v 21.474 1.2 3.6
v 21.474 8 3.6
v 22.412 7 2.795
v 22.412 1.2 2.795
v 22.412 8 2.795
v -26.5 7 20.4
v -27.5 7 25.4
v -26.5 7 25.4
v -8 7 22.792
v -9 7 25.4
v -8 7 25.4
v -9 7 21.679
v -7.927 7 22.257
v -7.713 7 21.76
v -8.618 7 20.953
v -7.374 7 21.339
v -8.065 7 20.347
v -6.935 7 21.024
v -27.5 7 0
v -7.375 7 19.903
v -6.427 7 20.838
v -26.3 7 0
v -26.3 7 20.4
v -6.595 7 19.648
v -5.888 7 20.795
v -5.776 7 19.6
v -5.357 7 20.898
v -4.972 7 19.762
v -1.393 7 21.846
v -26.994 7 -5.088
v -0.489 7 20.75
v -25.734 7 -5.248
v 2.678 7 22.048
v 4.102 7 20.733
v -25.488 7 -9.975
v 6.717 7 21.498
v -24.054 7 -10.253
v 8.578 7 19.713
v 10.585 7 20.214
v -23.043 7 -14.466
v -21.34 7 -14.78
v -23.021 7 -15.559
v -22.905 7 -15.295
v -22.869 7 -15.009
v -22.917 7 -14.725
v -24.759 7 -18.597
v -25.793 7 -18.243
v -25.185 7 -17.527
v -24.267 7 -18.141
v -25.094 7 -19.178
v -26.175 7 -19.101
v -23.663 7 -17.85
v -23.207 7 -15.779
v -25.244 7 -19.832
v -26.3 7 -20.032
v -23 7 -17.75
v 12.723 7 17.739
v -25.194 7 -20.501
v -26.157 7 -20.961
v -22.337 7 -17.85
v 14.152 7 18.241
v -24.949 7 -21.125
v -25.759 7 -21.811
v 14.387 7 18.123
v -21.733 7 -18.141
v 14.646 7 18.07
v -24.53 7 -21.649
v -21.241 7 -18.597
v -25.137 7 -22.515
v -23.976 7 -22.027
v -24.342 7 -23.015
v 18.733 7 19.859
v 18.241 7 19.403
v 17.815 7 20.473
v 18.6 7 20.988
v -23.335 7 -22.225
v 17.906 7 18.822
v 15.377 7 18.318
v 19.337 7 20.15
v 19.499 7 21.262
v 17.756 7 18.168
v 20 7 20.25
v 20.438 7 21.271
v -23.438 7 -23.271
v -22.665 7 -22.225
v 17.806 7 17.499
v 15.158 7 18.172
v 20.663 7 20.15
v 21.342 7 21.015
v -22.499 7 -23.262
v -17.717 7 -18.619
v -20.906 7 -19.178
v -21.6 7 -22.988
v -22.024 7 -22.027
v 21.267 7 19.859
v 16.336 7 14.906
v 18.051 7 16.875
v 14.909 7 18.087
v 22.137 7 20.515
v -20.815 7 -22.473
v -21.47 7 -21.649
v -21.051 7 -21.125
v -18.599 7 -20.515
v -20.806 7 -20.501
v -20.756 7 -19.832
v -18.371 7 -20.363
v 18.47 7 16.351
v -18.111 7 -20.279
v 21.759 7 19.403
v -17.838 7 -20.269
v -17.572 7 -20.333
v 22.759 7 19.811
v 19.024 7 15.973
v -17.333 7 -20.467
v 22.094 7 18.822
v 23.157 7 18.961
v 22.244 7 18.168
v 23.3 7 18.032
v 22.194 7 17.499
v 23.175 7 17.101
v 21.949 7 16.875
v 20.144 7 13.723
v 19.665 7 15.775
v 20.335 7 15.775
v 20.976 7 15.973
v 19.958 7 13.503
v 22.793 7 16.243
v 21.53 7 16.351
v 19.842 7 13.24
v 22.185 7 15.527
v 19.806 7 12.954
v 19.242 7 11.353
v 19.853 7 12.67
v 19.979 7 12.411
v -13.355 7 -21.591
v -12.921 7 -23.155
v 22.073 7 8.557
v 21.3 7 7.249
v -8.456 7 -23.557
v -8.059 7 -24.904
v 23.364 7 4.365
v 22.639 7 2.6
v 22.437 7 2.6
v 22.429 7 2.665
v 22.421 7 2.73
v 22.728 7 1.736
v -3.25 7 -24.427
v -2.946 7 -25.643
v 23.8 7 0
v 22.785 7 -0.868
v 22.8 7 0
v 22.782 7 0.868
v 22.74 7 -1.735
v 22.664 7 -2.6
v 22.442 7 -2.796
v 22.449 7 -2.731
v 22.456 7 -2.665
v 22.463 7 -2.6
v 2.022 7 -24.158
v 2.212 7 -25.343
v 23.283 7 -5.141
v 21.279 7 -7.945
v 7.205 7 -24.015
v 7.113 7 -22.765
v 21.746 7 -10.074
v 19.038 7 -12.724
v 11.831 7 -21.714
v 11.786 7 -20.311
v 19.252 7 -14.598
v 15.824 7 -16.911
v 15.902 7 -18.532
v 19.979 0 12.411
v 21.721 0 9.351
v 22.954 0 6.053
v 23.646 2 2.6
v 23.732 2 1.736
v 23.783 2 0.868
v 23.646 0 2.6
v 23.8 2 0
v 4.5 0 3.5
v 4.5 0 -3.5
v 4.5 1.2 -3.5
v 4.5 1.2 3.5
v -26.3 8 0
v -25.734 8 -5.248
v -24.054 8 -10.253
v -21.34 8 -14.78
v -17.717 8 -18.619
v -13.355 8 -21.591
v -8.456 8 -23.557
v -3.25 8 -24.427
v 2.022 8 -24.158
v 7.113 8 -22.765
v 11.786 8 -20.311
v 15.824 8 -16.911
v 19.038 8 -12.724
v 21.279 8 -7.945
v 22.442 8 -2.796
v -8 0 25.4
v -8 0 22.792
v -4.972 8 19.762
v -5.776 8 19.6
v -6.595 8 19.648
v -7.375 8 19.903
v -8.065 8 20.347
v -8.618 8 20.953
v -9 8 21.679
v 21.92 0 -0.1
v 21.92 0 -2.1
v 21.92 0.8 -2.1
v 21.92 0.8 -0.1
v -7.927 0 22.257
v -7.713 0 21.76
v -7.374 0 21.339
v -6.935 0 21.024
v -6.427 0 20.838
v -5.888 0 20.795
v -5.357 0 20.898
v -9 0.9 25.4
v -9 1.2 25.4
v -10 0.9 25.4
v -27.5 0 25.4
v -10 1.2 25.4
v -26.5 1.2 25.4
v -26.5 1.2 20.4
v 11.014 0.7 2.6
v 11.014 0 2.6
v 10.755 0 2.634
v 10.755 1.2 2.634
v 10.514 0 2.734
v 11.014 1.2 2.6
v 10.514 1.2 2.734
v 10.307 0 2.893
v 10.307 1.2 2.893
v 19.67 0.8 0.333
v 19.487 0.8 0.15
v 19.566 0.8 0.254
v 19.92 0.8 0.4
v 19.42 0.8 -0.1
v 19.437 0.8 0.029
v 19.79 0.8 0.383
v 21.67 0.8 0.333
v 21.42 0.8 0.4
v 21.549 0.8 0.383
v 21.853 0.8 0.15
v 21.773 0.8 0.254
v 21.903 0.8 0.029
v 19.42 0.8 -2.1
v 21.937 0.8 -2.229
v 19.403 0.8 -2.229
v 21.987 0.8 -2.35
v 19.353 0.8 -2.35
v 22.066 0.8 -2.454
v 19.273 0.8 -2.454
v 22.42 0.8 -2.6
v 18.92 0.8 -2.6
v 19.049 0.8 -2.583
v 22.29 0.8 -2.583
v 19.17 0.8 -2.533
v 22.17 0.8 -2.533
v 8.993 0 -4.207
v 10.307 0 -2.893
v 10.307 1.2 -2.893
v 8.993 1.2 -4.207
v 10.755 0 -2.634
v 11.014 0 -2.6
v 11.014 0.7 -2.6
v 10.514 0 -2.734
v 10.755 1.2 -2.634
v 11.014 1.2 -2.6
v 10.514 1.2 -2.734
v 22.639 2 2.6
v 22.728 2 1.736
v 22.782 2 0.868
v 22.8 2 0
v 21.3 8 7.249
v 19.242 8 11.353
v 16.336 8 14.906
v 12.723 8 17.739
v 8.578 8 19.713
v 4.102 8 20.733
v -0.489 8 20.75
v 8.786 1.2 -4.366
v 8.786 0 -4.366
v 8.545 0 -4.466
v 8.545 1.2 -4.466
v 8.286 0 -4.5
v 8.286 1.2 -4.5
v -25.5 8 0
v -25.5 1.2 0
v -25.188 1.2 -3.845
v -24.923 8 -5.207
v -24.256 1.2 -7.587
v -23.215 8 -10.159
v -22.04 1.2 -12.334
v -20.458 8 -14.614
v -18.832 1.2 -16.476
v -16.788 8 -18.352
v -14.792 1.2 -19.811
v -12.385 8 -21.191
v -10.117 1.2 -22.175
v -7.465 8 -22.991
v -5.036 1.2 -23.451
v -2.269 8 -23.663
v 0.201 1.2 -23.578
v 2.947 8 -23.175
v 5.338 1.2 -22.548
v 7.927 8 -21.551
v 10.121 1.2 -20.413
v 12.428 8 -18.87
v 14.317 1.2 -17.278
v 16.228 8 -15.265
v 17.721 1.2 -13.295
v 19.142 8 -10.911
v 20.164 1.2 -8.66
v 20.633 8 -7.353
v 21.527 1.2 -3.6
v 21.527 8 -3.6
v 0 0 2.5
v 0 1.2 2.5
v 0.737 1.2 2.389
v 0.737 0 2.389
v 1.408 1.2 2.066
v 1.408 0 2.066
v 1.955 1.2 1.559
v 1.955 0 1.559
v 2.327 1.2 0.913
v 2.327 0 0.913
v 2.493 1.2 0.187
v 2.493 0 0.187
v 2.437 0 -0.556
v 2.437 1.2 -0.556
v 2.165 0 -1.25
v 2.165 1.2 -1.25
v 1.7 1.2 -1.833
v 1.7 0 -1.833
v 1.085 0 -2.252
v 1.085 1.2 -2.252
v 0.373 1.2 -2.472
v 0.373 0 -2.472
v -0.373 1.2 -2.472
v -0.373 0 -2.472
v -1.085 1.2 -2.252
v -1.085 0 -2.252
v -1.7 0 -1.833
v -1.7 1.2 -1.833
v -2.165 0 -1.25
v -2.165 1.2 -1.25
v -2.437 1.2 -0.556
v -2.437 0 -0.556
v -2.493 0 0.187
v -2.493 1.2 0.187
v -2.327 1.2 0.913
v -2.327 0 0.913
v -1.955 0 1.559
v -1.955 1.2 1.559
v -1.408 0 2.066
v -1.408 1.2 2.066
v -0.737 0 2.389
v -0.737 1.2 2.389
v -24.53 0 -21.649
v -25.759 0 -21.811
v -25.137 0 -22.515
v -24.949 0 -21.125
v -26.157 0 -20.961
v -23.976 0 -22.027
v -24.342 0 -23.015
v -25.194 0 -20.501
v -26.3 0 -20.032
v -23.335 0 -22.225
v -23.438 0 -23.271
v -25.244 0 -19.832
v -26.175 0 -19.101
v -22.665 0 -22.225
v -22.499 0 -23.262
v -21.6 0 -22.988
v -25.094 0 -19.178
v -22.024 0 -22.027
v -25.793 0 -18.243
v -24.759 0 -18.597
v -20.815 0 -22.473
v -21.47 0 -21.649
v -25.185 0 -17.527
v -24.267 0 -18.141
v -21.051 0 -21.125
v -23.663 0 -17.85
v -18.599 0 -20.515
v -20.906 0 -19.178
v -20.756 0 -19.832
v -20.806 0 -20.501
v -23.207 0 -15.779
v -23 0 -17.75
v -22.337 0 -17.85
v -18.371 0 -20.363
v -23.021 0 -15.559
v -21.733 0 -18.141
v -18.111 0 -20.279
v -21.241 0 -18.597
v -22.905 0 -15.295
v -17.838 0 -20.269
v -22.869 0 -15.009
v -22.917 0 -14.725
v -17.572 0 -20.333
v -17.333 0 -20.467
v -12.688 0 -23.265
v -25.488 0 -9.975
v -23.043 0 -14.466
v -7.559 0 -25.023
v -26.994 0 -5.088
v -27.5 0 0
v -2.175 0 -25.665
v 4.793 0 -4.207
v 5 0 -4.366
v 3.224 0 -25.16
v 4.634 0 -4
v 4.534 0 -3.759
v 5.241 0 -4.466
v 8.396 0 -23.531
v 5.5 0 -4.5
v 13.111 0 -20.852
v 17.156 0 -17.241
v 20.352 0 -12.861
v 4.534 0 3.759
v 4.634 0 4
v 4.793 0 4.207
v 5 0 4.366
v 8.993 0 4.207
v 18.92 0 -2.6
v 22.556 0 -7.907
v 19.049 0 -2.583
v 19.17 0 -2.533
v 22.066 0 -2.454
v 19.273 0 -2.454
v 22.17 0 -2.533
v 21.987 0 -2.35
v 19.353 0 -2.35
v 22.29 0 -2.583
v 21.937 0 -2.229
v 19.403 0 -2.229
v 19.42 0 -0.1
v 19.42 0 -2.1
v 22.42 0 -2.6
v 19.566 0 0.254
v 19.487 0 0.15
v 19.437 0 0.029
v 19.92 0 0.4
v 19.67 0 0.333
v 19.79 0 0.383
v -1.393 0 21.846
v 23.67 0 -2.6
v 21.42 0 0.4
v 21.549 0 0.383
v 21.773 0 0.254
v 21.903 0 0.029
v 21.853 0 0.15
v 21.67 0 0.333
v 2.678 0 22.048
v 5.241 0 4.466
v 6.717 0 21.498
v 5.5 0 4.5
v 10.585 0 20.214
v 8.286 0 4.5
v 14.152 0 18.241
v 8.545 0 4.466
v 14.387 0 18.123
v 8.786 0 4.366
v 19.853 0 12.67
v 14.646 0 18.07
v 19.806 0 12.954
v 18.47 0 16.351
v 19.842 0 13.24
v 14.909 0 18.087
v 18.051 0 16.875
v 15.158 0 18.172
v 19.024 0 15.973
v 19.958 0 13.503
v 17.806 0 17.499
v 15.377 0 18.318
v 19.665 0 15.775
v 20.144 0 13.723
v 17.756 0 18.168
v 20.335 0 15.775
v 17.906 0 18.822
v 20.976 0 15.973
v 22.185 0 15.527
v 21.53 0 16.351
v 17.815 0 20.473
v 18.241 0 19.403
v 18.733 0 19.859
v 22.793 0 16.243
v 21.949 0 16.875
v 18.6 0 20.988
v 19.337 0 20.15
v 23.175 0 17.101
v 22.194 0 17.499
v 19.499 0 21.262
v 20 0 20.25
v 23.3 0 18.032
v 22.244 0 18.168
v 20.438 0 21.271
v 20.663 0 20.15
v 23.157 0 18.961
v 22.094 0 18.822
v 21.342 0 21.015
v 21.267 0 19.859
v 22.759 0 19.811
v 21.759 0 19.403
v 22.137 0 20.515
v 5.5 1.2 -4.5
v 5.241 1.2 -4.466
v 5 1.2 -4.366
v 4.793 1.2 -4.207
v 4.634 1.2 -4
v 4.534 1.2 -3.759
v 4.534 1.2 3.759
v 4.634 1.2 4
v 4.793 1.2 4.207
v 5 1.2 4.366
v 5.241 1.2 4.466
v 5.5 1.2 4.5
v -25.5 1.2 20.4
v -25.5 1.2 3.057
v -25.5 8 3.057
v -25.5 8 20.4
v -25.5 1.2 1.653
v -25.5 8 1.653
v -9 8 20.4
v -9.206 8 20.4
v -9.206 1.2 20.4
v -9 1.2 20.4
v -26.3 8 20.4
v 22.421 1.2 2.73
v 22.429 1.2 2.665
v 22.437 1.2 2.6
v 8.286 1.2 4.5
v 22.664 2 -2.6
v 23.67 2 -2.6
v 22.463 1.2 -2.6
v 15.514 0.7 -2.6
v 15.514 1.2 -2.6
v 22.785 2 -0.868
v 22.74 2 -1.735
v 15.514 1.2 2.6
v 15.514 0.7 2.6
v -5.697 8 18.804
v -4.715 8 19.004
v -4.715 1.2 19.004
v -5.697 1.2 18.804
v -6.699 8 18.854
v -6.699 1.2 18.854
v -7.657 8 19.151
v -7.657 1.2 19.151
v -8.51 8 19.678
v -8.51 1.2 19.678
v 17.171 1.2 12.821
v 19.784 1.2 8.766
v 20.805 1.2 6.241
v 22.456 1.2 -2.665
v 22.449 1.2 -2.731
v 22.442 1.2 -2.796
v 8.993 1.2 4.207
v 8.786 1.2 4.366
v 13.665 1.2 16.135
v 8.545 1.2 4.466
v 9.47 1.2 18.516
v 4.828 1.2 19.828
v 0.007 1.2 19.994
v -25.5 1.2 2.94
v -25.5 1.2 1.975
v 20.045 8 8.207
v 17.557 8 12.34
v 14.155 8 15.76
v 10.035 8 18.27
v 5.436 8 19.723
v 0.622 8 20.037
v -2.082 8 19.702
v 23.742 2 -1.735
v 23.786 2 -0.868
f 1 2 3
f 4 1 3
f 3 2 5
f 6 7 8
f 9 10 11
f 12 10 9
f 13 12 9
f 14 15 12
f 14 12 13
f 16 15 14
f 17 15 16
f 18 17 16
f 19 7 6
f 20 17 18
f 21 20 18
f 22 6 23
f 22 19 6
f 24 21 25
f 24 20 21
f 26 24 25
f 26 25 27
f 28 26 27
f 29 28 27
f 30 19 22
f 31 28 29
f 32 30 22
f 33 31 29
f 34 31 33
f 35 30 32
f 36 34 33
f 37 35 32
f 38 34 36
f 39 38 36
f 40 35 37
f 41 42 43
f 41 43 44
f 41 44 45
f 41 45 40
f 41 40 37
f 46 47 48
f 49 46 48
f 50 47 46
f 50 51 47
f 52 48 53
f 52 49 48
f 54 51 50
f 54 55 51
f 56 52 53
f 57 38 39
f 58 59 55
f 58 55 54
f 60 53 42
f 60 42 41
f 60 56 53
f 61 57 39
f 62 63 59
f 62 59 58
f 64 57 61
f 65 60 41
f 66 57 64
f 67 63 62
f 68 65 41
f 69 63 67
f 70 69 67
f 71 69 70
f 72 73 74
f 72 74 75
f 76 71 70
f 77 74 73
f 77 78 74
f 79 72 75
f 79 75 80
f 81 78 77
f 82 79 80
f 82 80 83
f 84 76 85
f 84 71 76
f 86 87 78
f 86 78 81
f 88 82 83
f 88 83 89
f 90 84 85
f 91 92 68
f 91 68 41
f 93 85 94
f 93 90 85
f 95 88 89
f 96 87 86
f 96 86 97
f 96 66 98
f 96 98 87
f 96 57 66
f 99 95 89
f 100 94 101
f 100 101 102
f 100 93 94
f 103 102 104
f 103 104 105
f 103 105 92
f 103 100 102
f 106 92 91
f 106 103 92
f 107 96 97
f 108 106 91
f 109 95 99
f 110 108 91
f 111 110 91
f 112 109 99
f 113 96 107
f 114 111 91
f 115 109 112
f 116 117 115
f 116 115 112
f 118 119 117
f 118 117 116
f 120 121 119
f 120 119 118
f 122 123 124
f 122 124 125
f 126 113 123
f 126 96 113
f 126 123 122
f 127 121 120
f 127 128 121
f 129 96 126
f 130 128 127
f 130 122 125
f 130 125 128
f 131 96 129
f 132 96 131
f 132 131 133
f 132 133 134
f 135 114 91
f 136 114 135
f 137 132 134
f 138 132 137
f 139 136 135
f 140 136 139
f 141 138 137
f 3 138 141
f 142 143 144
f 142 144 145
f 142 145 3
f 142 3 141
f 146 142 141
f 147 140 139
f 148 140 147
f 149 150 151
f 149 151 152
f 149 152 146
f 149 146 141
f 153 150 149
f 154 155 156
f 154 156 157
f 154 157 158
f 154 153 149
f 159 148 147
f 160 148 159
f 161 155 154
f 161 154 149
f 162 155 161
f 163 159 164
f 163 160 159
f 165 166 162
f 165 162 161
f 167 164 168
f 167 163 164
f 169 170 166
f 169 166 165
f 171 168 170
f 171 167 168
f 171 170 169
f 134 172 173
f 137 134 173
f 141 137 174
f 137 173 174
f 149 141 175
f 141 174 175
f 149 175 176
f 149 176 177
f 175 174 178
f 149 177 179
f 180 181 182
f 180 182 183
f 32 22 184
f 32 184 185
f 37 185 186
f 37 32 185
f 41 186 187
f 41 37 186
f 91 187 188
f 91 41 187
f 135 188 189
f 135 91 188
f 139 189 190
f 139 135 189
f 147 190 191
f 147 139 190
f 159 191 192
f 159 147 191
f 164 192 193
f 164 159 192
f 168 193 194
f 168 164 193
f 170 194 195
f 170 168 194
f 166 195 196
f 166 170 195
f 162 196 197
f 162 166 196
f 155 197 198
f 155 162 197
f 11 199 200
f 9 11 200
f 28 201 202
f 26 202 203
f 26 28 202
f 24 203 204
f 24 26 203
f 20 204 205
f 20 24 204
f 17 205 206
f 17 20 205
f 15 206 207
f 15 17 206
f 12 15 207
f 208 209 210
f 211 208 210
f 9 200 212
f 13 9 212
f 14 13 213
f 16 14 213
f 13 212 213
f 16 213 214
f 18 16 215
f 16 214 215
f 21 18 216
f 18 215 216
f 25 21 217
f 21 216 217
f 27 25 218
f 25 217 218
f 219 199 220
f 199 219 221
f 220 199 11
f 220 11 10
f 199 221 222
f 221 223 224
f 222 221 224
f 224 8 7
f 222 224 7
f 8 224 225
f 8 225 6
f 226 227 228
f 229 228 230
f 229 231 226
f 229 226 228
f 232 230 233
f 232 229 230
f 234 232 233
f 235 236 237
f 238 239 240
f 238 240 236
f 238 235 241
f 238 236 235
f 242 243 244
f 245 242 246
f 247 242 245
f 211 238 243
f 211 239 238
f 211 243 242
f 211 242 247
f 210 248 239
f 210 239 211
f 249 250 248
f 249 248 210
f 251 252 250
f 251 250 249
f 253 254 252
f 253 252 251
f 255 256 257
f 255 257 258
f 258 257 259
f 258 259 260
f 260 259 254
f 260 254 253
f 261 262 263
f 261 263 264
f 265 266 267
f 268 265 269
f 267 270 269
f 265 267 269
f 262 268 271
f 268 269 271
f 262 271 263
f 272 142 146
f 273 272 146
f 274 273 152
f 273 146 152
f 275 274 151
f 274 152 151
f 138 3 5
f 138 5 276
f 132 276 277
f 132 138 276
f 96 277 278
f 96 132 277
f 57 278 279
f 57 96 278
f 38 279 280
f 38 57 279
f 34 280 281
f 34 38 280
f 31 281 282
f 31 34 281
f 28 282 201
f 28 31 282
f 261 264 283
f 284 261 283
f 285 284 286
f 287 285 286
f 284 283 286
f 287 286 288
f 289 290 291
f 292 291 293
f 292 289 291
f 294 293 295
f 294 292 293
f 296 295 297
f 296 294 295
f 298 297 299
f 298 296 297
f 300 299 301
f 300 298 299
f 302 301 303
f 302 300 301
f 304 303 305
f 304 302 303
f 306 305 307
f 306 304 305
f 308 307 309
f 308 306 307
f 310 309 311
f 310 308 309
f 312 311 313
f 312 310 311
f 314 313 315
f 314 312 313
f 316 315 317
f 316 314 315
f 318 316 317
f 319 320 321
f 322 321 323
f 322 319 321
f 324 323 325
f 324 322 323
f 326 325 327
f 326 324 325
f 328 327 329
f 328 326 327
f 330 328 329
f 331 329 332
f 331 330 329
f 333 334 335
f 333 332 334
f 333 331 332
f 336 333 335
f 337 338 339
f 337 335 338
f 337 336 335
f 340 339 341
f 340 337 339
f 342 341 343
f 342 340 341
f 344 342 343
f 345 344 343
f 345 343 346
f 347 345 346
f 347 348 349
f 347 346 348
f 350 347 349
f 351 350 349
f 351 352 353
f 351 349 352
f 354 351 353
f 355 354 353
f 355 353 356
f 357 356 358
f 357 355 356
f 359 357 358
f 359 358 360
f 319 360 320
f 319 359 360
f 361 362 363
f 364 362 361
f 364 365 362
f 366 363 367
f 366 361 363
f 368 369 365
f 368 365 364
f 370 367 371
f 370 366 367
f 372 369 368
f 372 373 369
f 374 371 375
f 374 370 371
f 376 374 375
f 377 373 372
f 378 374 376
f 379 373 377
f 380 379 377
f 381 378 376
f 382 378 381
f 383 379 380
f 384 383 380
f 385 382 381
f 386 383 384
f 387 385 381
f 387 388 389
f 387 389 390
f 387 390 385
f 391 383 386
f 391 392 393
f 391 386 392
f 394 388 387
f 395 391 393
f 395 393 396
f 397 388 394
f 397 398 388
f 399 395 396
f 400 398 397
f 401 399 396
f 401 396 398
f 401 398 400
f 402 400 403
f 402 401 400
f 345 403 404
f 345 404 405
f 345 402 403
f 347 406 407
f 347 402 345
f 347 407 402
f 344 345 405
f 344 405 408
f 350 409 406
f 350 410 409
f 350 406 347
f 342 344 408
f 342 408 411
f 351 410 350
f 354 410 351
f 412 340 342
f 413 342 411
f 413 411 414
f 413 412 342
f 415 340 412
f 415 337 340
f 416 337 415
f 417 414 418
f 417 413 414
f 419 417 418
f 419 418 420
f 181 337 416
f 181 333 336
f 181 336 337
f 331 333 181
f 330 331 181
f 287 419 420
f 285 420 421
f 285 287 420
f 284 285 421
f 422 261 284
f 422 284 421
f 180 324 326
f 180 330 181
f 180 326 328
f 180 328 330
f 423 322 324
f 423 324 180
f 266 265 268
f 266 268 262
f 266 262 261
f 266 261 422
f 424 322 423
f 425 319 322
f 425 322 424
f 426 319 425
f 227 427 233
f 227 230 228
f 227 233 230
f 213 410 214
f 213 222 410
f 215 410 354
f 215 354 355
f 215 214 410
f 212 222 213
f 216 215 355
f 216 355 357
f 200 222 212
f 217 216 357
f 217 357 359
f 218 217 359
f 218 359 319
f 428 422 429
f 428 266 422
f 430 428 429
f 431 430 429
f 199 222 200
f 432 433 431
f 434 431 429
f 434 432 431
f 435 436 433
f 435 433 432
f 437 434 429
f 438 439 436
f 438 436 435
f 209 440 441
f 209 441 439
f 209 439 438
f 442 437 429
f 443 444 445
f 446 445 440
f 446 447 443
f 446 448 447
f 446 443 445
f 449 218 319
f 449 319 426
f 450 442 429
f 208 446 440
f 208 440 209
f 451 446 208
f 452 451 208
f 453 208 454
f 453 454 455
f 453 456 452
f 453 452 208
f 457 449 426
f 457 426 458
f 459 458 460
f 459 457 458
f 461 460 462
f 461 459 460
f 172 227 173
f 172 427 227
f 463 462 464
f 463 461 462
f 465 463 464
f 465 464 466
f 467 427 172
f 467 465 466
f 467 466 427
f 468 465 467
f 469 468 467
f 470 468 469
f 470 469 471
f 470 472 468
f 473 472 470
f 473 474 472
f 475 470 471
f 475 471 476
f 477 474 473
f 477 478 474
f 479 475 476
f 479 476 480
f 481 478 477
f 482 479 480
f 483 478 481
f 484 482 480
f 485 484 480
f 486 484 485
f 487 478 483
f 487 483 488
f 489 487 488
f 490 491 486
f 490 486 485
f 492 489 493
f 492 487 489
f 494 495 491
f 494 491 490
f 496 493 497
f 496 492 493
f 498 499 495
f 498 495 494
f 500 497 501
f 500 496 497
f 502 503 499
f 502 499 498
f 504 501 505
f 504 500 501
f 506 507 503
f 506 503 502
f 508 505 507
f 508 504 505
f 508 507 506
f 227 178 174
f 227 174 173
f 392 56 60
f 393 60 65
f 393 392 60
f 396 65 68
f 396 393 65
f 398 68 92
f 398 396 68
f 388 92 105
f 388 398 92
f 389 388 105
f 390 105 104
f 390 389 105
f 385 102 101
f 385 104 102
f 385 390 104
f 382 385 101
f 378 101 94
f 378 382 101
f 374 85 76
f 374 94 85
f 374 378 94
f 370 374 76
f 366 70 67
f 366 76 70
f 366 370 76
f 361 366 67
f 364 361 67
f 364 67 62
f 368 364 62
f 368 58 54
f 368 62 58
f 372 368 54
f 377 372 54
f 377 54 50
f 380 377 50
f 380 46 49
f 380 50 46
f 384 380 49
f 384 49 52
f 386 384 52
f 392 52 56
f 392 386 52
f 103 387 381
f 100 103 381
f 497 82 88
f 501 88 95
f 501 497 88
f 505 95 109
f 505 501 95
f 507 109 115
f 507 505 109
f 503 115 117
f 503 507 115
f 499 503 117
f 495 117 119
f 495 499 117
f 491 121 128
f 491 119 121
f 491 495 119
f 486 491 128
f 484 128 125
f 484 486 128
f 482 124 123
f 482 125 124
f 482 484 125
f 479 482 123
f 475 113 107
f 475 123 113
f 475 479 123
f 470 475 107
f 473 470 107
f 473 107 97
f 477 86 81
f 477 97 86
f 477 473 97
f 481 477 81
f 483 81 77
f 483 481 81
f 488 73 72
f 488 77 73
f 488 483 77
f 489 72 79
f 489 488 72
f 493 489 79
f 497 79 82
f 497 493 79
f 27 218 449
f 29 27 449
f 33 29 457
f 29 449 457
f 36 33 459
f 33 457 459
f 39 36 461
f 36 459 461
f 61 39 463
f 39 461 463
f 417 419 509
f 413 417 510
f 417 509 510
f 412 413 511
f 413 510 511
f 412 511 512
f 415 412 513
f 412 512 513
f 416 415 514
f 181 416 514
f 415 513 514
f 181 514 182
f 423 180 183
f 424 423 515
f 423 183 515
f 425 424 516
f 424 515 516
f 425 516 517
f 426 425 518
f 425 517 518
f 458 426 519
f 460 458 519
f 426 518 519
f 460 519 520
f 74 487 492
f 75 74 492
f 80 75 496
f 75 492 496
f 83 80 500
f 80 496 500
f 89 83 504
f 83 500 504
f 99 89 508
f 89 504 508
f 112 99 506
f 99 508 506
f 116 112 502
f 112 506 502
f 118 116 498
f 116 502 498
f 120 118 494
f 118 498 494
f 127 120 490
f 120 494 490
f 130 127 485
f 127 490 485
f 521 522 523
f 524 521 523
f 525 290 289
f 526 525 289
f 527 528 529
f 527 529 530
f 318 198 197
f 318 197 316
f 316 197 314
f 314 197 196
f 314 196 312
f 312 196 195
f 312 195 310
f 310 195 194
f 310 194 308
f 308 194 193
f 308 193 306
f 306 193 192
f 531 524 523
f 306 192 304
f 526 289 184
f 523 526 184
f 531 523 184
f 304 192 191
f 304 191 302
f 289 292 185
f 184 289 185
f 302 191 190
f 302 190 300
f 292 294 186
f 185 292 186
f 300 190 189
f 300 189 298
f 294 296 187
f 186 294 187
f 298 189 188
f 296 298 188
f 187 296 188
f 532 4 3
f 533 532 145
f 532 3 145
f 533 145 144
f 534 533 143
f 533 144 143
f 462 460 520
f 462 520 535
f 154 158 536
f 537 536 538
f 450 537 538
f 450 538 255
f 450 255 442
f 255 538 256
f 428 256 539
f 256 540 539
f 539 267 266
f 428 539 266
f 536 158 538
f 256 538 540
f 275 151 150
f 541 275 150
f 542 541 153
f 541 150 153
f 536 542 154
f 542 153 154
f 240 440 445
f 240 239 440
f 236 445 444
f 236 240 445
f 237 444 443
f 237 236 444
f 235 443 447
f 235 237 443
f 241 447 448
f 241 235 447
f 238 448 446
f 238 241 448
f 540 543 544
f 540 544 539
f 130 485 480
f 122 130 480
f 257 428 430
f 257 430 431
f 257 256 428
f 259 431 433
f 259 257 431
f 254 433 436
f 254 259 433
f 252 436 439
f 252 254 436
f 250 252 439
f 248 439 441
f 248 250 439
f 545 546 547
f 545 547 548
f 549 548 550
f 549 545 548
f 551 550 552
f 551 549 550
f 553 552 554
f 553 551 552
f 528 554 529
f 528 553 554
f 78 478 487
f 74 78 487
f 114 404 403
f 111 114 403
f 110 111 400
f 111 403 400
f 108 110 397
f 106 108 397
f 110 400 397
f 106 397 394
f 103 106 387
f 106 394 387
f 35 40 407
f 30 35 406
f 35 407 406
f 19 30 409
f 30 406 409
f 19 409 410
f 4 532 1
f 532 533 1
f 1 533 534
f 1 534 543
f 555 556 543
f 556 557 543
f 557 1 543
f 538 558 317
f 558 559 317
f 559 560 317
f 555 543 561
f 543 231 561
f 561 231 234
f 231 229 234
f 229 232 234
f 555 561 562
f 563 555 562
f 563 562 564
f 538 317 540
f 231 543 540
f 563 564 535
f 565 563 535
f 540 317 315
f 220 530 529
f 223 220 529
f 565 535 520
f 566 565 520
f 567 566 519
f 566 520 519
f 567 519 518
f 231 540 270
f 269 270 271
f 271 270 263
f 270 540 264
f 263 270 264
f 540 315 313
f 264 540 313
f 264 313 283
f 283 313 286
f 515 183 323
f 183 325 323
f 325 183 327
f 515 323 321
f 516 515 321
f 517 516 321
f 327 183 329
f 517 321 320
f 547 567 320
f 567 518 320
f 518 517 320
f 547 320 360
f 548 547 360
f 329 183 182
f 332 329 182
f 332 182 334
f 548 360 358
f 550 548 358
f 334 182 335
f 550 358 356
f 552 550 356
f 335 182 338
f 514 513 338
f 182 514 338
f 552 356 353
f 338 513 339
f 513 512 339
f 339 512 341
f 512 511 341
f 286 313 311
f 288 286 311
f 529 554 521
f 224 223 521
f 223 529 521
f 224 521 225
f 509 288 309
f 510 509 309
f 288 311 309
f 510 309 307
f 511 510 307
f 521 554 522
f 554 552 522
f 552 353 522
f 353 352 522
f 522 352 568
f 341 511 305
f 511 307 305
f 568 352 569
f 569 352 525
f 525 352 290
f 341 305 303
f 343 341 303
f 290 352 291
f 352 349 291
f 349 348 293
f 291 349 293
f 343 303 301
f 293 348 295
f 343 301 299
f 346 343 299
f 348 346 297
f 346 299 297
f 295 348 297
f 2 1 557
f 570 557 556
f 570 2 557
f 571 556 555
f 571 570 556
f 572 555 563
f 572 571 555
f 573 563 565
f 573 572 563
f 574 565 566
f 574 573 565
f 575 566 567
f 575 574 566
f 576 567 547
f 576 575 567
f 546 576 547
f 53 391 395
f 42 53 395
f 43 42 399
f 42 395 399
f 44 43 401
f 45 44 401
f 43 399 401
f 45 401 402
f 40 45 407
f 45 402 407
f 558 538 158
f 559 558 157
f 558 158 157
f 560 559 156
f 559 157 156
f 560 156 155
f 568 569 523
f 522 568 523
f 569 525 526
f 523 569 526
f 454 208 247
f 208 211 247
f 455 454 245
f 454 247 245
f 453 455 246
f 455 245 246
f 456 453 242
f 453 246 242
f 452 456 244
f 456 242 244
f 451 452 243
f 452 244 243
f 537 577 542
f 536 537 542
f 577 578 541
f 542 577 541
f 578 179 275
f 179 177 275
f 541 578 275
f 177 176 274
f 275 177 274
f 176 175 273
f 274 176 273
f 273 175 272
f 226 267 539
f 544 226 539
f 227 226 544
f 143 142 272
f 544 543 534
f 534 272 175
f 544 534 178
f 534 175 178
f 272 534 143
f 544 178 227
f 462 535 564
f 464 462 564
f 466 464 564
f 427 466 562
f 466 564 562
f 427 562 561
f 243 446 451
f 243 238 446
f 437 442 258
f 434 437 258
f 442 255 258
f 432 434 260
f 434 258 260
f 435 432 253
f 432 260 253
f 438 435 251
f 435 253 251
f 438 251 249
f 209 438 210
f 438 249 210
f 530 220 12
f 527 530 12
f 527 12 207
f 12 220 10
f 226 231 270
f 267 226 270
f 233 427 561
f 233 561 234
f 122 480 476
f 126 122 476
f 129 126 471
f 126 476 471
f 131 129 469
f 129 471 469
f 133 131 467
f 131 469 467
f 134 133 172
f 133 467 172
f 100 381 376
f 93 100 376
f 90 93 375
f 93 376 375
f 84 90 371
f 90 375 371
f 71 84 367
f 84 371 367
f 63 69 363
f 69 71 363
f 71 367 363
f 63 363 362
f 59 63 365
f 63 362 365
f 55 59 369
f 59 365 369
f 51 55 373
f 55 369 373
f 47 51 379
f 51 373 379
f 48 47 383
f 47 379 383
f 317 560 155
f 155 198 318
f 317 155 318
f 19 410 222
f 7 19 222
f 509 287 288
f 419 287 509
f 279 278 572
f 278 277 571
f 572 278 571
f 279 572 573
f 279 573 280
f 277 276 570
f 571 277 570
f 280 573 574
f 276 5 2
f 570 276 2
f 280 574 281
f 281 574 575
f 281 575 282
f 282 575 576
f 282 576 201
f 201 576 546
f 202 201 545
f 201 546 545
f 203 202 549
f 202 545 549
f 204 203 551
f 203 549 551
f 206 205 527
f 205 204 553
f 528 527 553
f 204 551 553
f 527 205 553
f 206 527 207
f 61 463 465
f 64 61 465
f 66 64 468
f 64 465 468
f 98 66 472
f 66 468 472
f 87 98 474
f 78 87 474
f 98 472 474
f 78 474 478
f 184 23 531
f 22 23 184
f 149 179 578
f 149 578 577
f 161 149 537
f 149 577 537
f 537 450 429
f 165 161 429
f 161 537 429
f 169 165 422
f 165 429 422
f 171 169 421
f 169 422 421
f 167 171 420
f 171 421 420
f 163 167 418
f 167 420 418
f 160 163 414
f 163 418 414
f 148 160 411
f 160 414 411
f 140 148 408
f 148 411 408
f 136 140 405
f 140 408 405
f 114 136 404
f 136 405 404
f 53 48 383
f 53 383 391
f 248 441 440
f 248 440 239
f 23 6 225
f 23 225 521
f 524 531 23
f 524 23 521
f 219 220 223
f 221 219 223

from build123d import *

# Parameters (mm, degrees)
SKETCH_1_R          = 2.25
SKETCH_1_R_2        = 2.5
EXTRUDE_1_DEPTH     = 8
CUT_EXTRUDE_1_DEPTH = 6.8
SKETCH_3_OUTSIDE_W  = 67.866
SKETCH_3_OUTSIDE_H  = 67.633
CUT_EXTRUDE_4_DEPTH = 1
SKETCH_5_R          = 2.825
SKETCH_5_R_2        = 2.25
EXTRUDE_2_DEPTH     = 1.5
CUT_EXTRUDE_5_DEPTH = 0.5
CUT_EXTRUDE_6_DEPTH = 2
FILLET_1_R          = 1
SKETCH_8_W          = 2.5
SKETCH_8_H          = 0.8
EXTRUDE_4_DEPTH     = 3
FILLET_2_R          = 0.5
CUT_EXTRUDE_7_DEPTH = 0.3
FILLET_3_R          = 0.1
FILLET_4_R          = 3
SKETCH_10_W         = 4.5
SKETCH_10_H         = 5.2
EXTRUDE_5_DEPTH     = 0.5
SKETCH2_W           = 1
SKETCH2_H           = 7.1
CUT_SWEEP1_START    = 7
CUT_SWEEP1_DEPTH    = 1
SKETCH5_R           = 2.825
CUT_EXTRUDE1_DEPTH  = 39.262710934
CUT_EXTRUDE2_REACH  = 40.458
BOSS_EXTRUDE2_REACH = 40.227
BOSS_EXTRUDE1_START = 0.5
BOSS_EXTRUDE1_DEPTH = 0.5
SKETCH_11_W         = 1
SKETCH_11_H         = 6.8
CUT_EXTRUDE_8_DEPTH = 5


# Read off the part's stored shape, not the designer's step: Cut-Sweep1
with BuildPart() as part:
    # Эскиз1 → Бобышка-Вытянуть1 (new body)
    with BuildSketch(Plane(origin=(0, 0, 0), x_dir=(1, 0, 0), z_dir=(0, 1, 0))):
        with BuildLine():
            Line((-27.5, -25.4), (-8, -25.4))
            Line((-8, -25.4), (-8, -22.792302991))
            ThreePointArc((-8, -22.792302991), (-7.16511566, -21.166724479), (-5.357494501, -20.89831601))
            ThreePointArc((-5.357494501, -20.89831601), (4.710003701, -21.866199594), (14.151976117, -18.241220202))
            ThreePointArc((14.151976117, -18.241220202), (14.777726241, -18.069792078), (15.376980036, -18.318480053))
            Line((15.376980036, -18.318480053), (17.814747272, -20.472785982))
            ThreePointArc((17.814747272, -20.472785982), (22.472785982, -20.185252728), (22.185252728, -15.527214018))
            Line((22.185252728, -15.527214018), (20.143734708, -13.723081814))
            ThreePointArc((20.143734708, -13.723081814), (19.813719174, -13.098302749), (19.979075206, -12.411340949))
            ThreePointArc((19.979075206, -12.411340949), (22.823148445, -6.493089604), (23.8, 0))
            ThreePointArc((23.8, 0), (9.576401492, 22.98111988), (-17.333078903, 20.466663618))
            ThreePointArc((-17.333078903, 20.466663618), (-17.974550182, 20.264645495), (-18.598905377, 20.514600122))
            Line((-18.598905377, 20.514600122), (-20.814747272, 22.472785982))
            ThreePointArc((-20.814747272, 22.472785982), (-25.472785982, 22.185252728), (-25.185252728, 17.527214018))
            Line((-25.185252728, 17.527214018), (-23.20688118, 15.778885673))
            ThreePointArc((-23.20688118, 15.778885673), (-22.876796583, 15.153555184), (-23.04284729, 14.466226133))
            ThreePointArc((-23.04284729, 14.466226133), (-26.362874376, 7.569397218), (-27.5, 0))
            Line((-27.5, 0), (-27.5, -25.4))
        make_face()
        with Locations(Location((-23, 20, 0), (0, 0, 270))):
            Circle(SKETCH_1_R, mode=Mode.SUBTRACT)
        with Locations(Location((20, -18, 0), (0, 0, 270))):
            Circle(SKETCH_1_R, mode=Mode.SUBTRACT)
        with Locations(Location((0, 0, 0), (0, 0, 270))):
            Circle(SKETCH_1_R_2, mode=Mode.SUBTRACT)
    extrude(amount=EXTRUDE_1_DEPTH)

    # Эскиз2 → Вырез-Вытянуть1 (cut)
    with BuildSketch(Plane(origin=(0, 8, 0), x_dir=(1, 0, 0), z_dir=(0, 1, 0))):
        with BuildLine():
            Line((-9, -25.4), (-9, -22.792302991))
            ThreePointArc((-9, -22.792302991), (-7.74767349, -20.353935223), (-5.036241751, -19.95132252))
            ThreePointArc((-5.036241751, -19.95132252), (4.575054369, -20.875347093), (13.589169994, -17.414631267))
            ThreePointArc((13.589169994, -17.414631267), (16.632858543, -14.893819788), (19.152217909, -11.84892917))
            ThreePointArc((19.152217909, -11.84892917), (21.867461922, -6.198703298), (22.799999997, 0.000326884))
            ThreePointArc((22.799999997, 0.000326884), (9.131074658, 22.085751778), (-16.729450225, 19.669398029))
            ThreePointArc((-16.729450225, 19.669398029), (-19.707335368, 17.009099388), (-22.216615604, 13.902895678))
            ThreePointArc((-22.216615604, 13.902895678), (-25.407255169, 7.27479247), (-26.500000107, 0.000327424))
            Line((-26.500000107, 0.000327424), (-26.5, -25.4))
            Line((-26.5, -25.4), (-9, -25.4))
        make_face()
    extrude(amount=-CUT_EXTRUDE_1_DEPTH, mode=Mode.SUBTRACT)

    # Эскиз3 outside → Вырез-Вытянуть4 (cut)
    with BuildSketch(Plane(origin=(0, 8, 0), x_dir=(1, 0, 0), z_dir=(0, 1, 0))):
        with Locations((-1.85, 0.1335)):
            Rectangle(SKETCH_3_OUTSIDE_W, SKETCH_3_OUTSIDE_H)
        with BuildLine():
            Line((-8.5, -25.4), (-8.5, -22.792302991))
            ThreePointArc((-8.5, -22.792302991), (-7.456394575, -20.760329851), (-5.196868126, -20.424819265))
            ThreePointArc((-5.196868126, -20.424819265), (14.296629108, -17.530257554), (23.3, 0.000122775))
            ThreePointArc((23.3, 0.000122775), (-1.849981192, 25.166802402), (-26.999999983, 0.000160392))
            Line((-26.999999983, 0.000160392), (-27.000000053, -25.4))
            Line((-27.000000053, -25.4), (-8.5, -25.4))
        make_face(mode=Mode.SUBTRACT)
    extrude(amount=-CUT_EXTRUDE_4_DEPTH, mode=Mode.SUBTRACT)

    # Эскиз5 → Бобышка-Вытянуть2 (add)
    # profile 1 of 2: a face of its own
    with BuildSketch(Plane(origin=(0, 7, 0), x_dir=(1, 0, 0), z_dir=(0, 1, 0))):
        with Locations(Location((20, -18, 0), (0, 0, 270))):
            Circle(SKETCH_5_R)
        with Locations(Location((20, -18, 0), (0, 0, 270))):
            Circle(SKETCH_5_R_2, mode=Mode.SUBTRACT)
    # profile 2 of 2: a face of its own
    with BuildSketch(Plane(origin=(0, 7, 0), x_dir=(1, 0, 0), z_dir=(0, 1, 0))):
        with Locations(Location((-23, 20, 0), (0, 0, 270))):
            Circle(SKETCH_5_R)
        with Locations(Location((-23, 20, 0), (0, 0, 270))):
            Circle(SKETCH_5_R_2, mode=Mode.SUBTRACT)
    extrude(amount=EXTRUDE_2_DEPTH)

    # Эскиз6 → Вырез-Вытянуть5 (cut)
    with BuildSketch(Plane.XZ):
        with BuildLine():
            Line((-8.124359088, -8.831465869), (-12.079320344, -12.786427125))
            Line((-12.079320344, -12.786427125), (-15.112213356, -15.819320137))
            ThreePointArc((-15.112213356, -15.819320137), (-8.444967684, -20.565662067), (-0.5, -22.529692378))
            Line((-0.5, -22.529692378), (-0.5, -18.690864606))
            Line((-0.5, -18.690864606), (-0.5, -11.989578808))
            ThreePointArc((-0.5, -11.989578808), (-4.592201188, -11.08655439), (-8.124359088, -8.831465869))
        make_face()
        with BuildLine():
            Line((-15.787974775, -15.080867994), (-12.786427125, -12.079320344))
            Line((-12.786427125, -12.079320344), (-8.831465869, -8.124359088))
            ThreePointArc((-8.831465869, -8.124359088), (-11.08655439, -4.592201188), (-11.989578808, -0.5))
            Line((-11.989578808, -0.5), (-19.679374583, -0.5))
            Line((-19.679374583, -0.5), (-21.191246789, -0.5))
            ThreePointArc((-21.191246789, -0.5), (-19.828810643, -8.286704941), (-15.787974775, -15.080867994))
        make_face()
        with BuildLine():
            Line((-21.159916823, 0.5), (-19.679374583, 0.5))
            Line((-19.679374583, 0.5), (-11.989578808, 0.5))
            ThreePointArc((-11.989578808, 0.5), (-11.08655439, 4.592201188), (-8.831465869, 8.124359088))
            Line((-8.831465869, 8.124359088), (-11.509243088, 10.802136307))
            Line((-11.509243088, 10.802136307), (-15.133940377, 14.426833596))
            ThreePointArc((-15.133940377, 14.426833596), (-19.393122123, 8.00263002), (-21.159916823, 0.5))
        make_face()
        with BuildLine():
            Line((-14.426833596, 15.133940377), (-10.802136307, 11.509243088))
            Line((-10.802136307, 11.509243088), (-8.124359088, 8.831465869))
            ThreePointArc((-8.124359088, 8.831465869), (-4.592201188, 11.08655439), (-0.5, 11.989578808))
            Line((-0.5, 11.989578808), (-0.5, 17.569097793))
            Line((-0.5, 17.569097793), (-0.5, 21.159916823))
            ThreePointArc((-0.5, 21.159916823), (-8.00263002, 19.393122123), (-14.426833596, 15.133940377))
        make_face()
        with BuildLine():
            Line((0.5, 21.191246789), (0.5, 17.569097793))
            Line((0.5, 17.569097793), (0.5, 11.989578808))
            ThreePointArc((0.5, 11.989578808), (4.592201188, 11.08655439), (8.124359088, 8.831465869))
            Line((8.124359088, 8.831465869), (11.227255938, 11.93436272))
            Line((11.227255938, 11.93436272), (15.080867994, 15.787974775))
            ThreePointArc((15.080867994, 15.787974775), (8.286704941, 19.828810643), (0.5, 21.191246789))
        make_face()
        with BuildLine():
            Line((11.522911958, 3.35), (18.148882908, 3.35))
            Line((18.148882908, 3.35), (22.186495338, 3.35))
            ThreePointArc((22.186495338, 3.35), (19.923839699, 9.729629785), (15.819320137, 15.112213356))
            Line((15.819320137, 15.112213356), (11.93436272, 11.227255938))
            Line((11.93436272, 11.227255938), (8.831465869, 8.124359088))
            ThreePointArc((8.831465869, 8.124359088), (10.453410944, 5.892893995), (11.522911958, 3.35))
        make_face()
        with BuildLine():
            Line((8.831465869, -8.124359088), (10.382914295, -9.675807513))
            Line((10.382914295, -9.675807513), (16.503715933, -15.796609151))
            ThreePointArc((16.503715933, -15.796609151), (20.456263822, -10.049295735), (22.398860789, -3.35))
            Line((22.398860789, -3.35), (18.148882908, -3.35))
            Line((18.148882908, -3.35), (11.522911958, -3.35))
            ThreePointArc((11.522911958, -3.35), (10.453410944, -5.892893995), (8.831465869, -8.124359088))
        make_face()
        with BuildLine():
            Line((0.5, -11.989578808), (0.5, -18.690864606))
            Line((0.5, -18.690864606), (0.5, -22.561022344))
            ThreePointArc((0.5, -22.561022344), (8.739410144, -21.025097131), (15.796609151, -16.503715933))
            Line((15.796609151, -16.503715933), (9.675807513, -10.382914295))
            Line((9.675807513, -10.382914295), (8.124359088, -8.831465869))
            ThreePointArc((8.124359088, -8.831465869), (4.592201188, -11.08655439), (0.5, -11.989578808))
        make_face()
    extrude(amount=-CUT_EXTRUDE_5_DEPTH, mode=Mode.SUBTRACT)

    # Эскиз7 → Вырез-Вытянуть6 (cut)
    with BuildSketch(Plane.XZ):
        with BuildLine():
            Line((23.669597249, -2.6), (10.6, -2.6))
            Line((10.6, -2.6), (8.7, -4.5))
            Line((8.7, -4.5), (4.5, -4.5))
            Line((4.5, -4.5), (4.5, 4.5))
            Line((4.5, 4.5), (8.7, 4.5))
            Line((8.7, 4.5), (10.6, 2.6))
            Line((10.6, 2.6), (23.646302286, 2.6))
            ThreePointArc((23.646302286, 2.6), (23.761542061, 1.30226946), (23.8, 0))
            ThreePointArc((23.8, 0), (23.767804759, -1.30165542), (23.669597249, -2.6))
        make_face()
    extrude(amount=-CUT_EXTRUDE_6_DEPTH, mode=Mode.SUBTRACT)

    # Скругление1
    fillet_1_edges = [part.edges().sort_by_distance(p)[0] for p in [
        (10.6, 0.6, -2.6),
        (8.7, 0.6, -4.5),
        (4.5, 0.6, -4.5),
        (4.5, 0.6, 4.5),
        (8.7, 0.6, 4.5),
        (10.6, 0.6, 2.6),
    ]]
    fillet(fillet_1_edges, radius=FILLET_1_R)

    # Эскиз8 → Бобышка-Вытянуть4 (add)
    with BuildSketch(Plane.XY.offset(-2.6)):
        with Locations((20.669597249, 0.4)):
            Rectangle(SKETCH_8_W, SKETCH_8_H)
    extrude(amount=EXTRUDE_4_DEPTH)

    # Скругление2
    fillet_2_edges = [part.edges().sort_by_distance(p)[0] for p in [
        (21.919597249, 0.4, -2.6),
        (19.419597249, 0.4, -2.6),
        (21.919597249, 0.4, 0.4),
        (19.419597249, 0.4, 0.4),
    ]]
    fillet(fillet_2_edges, radius=FILLET_2_R)

    # Эскиз9 → Вырез-Вытянуть7 (cut)
    with BuildSketch(Plane(origin=(0, 1.2, 0), x_dir=(1, 0, 0), z_dir=(0, 1, 0))):
        with BuildLine():
            Line((-9, -22.792302991), (-9, -25.4))
            Line((-9, -25.4), (-26.500000053, -25.4))
            Line((-26.500000053, -25.4), (-26.500000053, 0.000327424))
            ThreePointArc((-26.500000053, 0.000327424), (-21.616141743, -14.364380593), (-9, -22.792302991))
        make_face()
    extrude(amount=-CUT_EXTRUDE_7_DEPTH, mode=Mode.SUBTRACT)

    # Скругление3
    fillet_3_edges = [part.edges().sort_by_distance(p)[0] for p in [
        (-26.500000053, 1.05, -0.000327424),
    ]]
    fillet(fillet_3_edges, radius=FILLET_3_R)

    # Скругление4
    # the kernel refuses this fillet: 3 mm, written as the material it takes off along each edge
    with BuildSketch(Plane(origin=(-26.400000053, 1.2, 3.057274541), x_dir=(0.992360523213108, 0, -0.1233717632532123), z_dir=(-0.1233717632532123, 0, -0.992360523213108))) as fillet_4_piece_1_section:
        with BuildLine():
            CenterArc((-1.407669683, 3), FILLET_4_R, 270, 25.841932763)
            Line((-0.1, 0.3), (-0.1, 0))
            Line((-0.1, 0), (-1.407669683, 0))
        make_face()
    fillet_4_piece_1 = revolve(axis=Axis((-26.400000053, 1.2, 3.057274541), (0, -1, 0)), revolution_arc=359.64, mode=Mode.PRIVATE)
    fillet_4_piece_1 = split(fillet_4_piece_1, bisect_by=Plane(origin=(-26.500000097, 1.12988638, 2.323319391), z_dir=(1.0, 0, -4.220683577170919e-09)), keep=Keep.TOP, mode=Mode.PRIVATE)
    add(fillet_4_piece_1, mode=Mode.SUBTRACT)
    with BuildSketch(Plane(origin=(-2.886480145, 1.2, -0.01610437), x_dir=(-0.9915657723161722, 0, 0.12960447203331021), z_dir=(-0.12960447203331021, 0, -0.9915657723161722))) as fillet_4_piece_2_section:
        with BuildLine():
            CenterArc((22.305855495, -3), FILLET_4_R, 64.158067237, 25.841932763)
            Line((23.613525178, -0.3), (23.613525178, 0))
            Line((23.613525178, 0), (22.305855495, 0))
        make_face()
    fillet_4_piece_2 = revolve(axis=Axis((-2.886480145, 1.2, -0.01610437), (0, 1, 0)), revolution_arc=75.482624122, mode=Mode.PRIVATE)
    fillet_4_piece_2 = fillet_4_piece_2 - Plane(origin=(-6, 1.12988638, 22.792302991), x_dir=(-1, 0, 0), z_dir=(0, 1, 0)) * Cylinder(3, 95, mode=Mode.PRIVATE)
    add(fillet_4_piece_2, mode=Mode.SUBTRACT)



with BuildPart() as body_2:
    # Эскиз10 → Бобышка-Вытянуть5 (new body)
    with BuildSketch(Plane(origin=(0, 1.2, 0), x_dir=(1, 0, 0), z_dir=(0, 1, 0))):
        with Locations((13.264213562, 0)):
            Rectangle(SKETCH_10_W, SKETCH_10_H)
    extrude(amount=-EXTRUDE_5_DEPTH)


with BuildPart() as part_1:
    add(part.part)

    add(body_2.part)  # Sweep1 merges body 2
    # Sweep1: sweep along a path in Sketch1
    with BuildLine(Plane(origin=(0, 1.2, 0), x_dir=(1, 0, 0), z_dir=(0, 1, 0))) as sweep1_path:
        Line((-26.500000053, -25.4), (-26.500000053, -3.057274222))
        Line((-26.500000053, -3.057274222), (-26.5000001, -1.653161001))
        Line((-26.5000001, -1.653161001), (-26.500000053, 0.000327424))
        ThreePointArc((-26.500000053, 0.000327424), (-3.1516065, 24.632413754), (22.664278196, 2.6))
        Line((22.664278196, 2.6), (11.014213562, 2.6))
        ThreePointArc((11.014213562, 2.6), (10.63153013, 2.676120467), (10.307106781, 2.892893219))
        Line((10.307106781, 2.892893219), (8.992893219, 4.207106781))
        ThreePointArc((8.992893219, 4.207106781), (8.66846987, 4.423879533), (8.285786438, 4.5))
        Line((8.285786438, 4.5), (5.5, 4.5))
        ThreePointArc((5.5, 4.5), (4.792893219, 4.207106781), (4.5, 3.5))
        Line((4.5, 3.5), (4.5, -3.5))
        ThreePointArc((4.5, -3.5), (4.792893219, -4.207106781), (5.5, -4.5))
        Line((5.5, -4.5), (8.285786438, -4.5))
        ThreePointArc((8.285786438, -4.5), (8.66846987, -4.423879533), (8.992893219, -4.207106781))
        Line((8.992893219, -4.207106781), (10.307106781, -2.892893219))
        ThreePointArc((10.307106781, -2.892893219), (10.63153013, -2.676120467), (11.014213562, -2.6))
        Line((11.014213562, -2.6), (22.638952089, -2.6))
        ThreePointArc((22.638952089, -2.6), (12.923171816, -17.849919478), (-5.036241751, -19.95132252))
        ThreePointArc((-5.036241751, -19.95132252), (-7.173656162, -20.0314098), (-8.714467978, -21.51493711))
        ThreePointArc((-8.714467978, -21.51493711), (-8.92774691, -22.137858163), (-9, -22.792302991))
        Line((-9, -22.792302991), (-9, -25.4))
    # Sketch2 → Sweep1 (sweep)
    with BuildSketch(Plane.XY.offset(25.4)):
        with Locations((-26.000000053, 4.45)):
            Rectangle(SKETCH2_W, SKETCH2_H)
    sweep(path=sweep1_path.line, transition=Transition.RIGHT)

    # Cut-Sweep1 outline → Cut-Sweep1 (cut)
    with BuildSketch(Plane(origin=(0, 0, 0), x_dir=(1, 0, 0), z_dir=(0, 1, 0)).offset(CUT_SWEEP1_START)):
        with BuildLine():
            ThreePointArc((22.437396466, -2.6), (12.80639373, -17.687072715), (-4.971991179, -19.761923752))
            ThreePointArc((-4.971991179, -19.761923752), (-7.864185099, -20.191377313), (-9.200000073, -22.792302992))
            Line((-9.200000073, -22.792302992), (-9.200000073, -25.4))
            Line((-9.200000073, -25.4), (-8.5, -25.4))
            Line((-8.5, -25.4), (-8.5, -22.792302991))
            ThreePointArc((-8.5, -22.792302991), (-7.456394575, -20.760329851), (-5.196868126, -20.424819265))
            ThreePointArc((-5.196868126, -20.424819265), (14.296629108, -17.530257554), (23.3, 0.000122775))
            ThreePointArc((23.3, 0.000122775), (-1.849981192, 25.166802381), (-27.000000004, 0.000160391))
            Line((-27.000000004, 0.000160391), (-27.000000053, -25.4))
            Line((-27.000000053, -25.4), (-26.3, -25.4))
            Line((-26.3, -25.4), (-26.29999995, 0.000391914))
            ThreePointArc((-26.29999995, 0.000391914), (-3.151603523, 24.432132117), (22.463161627, 2.6))
            Line((22.463161627, 2.6), (22.664278196, 2.6))
            ThreePointArc((22.664278196, 2.6), (22.766481044, 1.30195634), (22.800000052, 0.000326884))
            ThreePointArc((22.800000052, 0.000326884), (22.759709581, -1.302328371), (22.638952089, -2.6))
            Line((22.638952089, -2.6), (22.437396466, -2.6))
        make_face()
    extrude(amount=CUT_SWEEP1_DEPTH, mode=Mode.SUBTRACT)

    # Sketch5 → Cut-Extrude1 (cut, through all)
    with BuildSketch(Plane(origin=(0, 7, 0), x_dir=(1, 0, 0), z_dir=(0, 1, 0))):
        with Locations((-23, 20)):
            Circle(SKETCH5_R)
        with Locations((20, -18)):
            Circle(SKETCH5_R)
    extrude(amount=CUT_EXTRUDE1_DEPTH, mode=Mode.SUBTRACT)

    # Cut-Extrude2: up to this face of the body (flat: up to its plane)
    cut_extrude2_end = Plane(part_1.part.faces().sort_by_distance((-3.353641126, 1.2, -1.27781855))[0])
    # Sketch6 → Cut-Extrude2 (cut, up to the picked face)
    with BuildSketch(Plane(origin=(0, 8, 0), x_dir=(1, 0, 0), z_dir=(0, 1, 0)), mode=Mode.PRIVATE) as cut_extrude2_sk1:
        with BuildLine():
            Line((8.285786438, 5.5), (5.5, 5.5))
            ThreePointArc((5.5, 5.5), (4.085786438, 4.914213562), (3.5, 3.5))
            Line((3.5, 3.5), (3.5, -3.5))
            ThreePointArc((3.5, -3.5), (4.085786438, -4.914213562), (5.5, -5.5))
            Line((5.5, -5.5), (8.285786438, -5.5))
            ThreePointArc((8.285786438, -5.5), (9.051153302, -5.347759065), (9.7, -4.914213562))
            Line((9.7, -4.914213562), (11.014213562, -3.6))
            Line((11.014213562, -3.6), (11.014213562, -2.6))
            ThreePointArc((11.014213562, -2.6), (10.63153013, -2.676120467), (10.307106781, -2.892893219))
            Line((10.307106781, -2.892893219), (8.992893219, -4.207106781))
            ThreePointArc((8.992893219, -4.207106781), (8.66846987, -4.423879533), (8.285786438, -4.5))
            Line((8.285786438, -4.5), (5.5, -4.5))
            ThreePointArc((5.5, -4.5), (4.792893219, -4.207106781), (4.5, -3.5))
            Line((4.5, -3.5), (4.5, 3.5))
            ThreePointArc((4.5, 3.5), (4.792893219, 4.207106781), (5.5, 4.5))
            Line((5.5, 4.5), (8.285786438, 4.5))
            ThreePointArc((8.285786438, 4.5), (8.66846987, 4.423879533), (8.992893219, 4.207106781))
            Line((8.992893219, 4.207106781), (10.307106781, 2.892893219))
            ThreePointArc((10.307106781, 2.892893219), (10.63153013, 2.676120467), (11.014213562, 2.6))
            Line((11.014213562, 2.6), (22.463161627, 2.6))
            ThreePointArc((22.463161627, 2.6), (22.452556294, 2.69793922), (22.44155644, 2.795834914))
            Line((22.44155644, 2.795834914), (21.526984795, 3.6))
            Line((21.526984795, 3.6), (11.014213562, 3.6))
            Line((11.014213562, 3.6), (9.7, 4.914213562))
            ThreePointArc((9.7, 4.914213562), (9.051153302, 5.347759065), (8.285786438, 5.5))
        make_face()
    cut_extrude2_tool1 = split(extrude(cut_extrude2_sk1.sketch, amount=-CUT_EXTRUDE2_REACH, mode=Mode.PRIVATE), bisect_by=cut_extrude2_end, keep=Keep.BOTH, mode=Mode.PRIVATE)
    # Sketch6 → Cut-Extrude2 (cut, up to the picked face)
    with BuildSketch(Plane(origin=(0, 8, 0), x_dir=(1, 0, 0), z_dir=(0, 1, 0)), mode=Mode.PRIVATE) as cut_extrude2_sk2:
        with BuildLine():
            Line((11.014213562, -3.6), (21.474458504, -3.6))
            Line((21.474458504, -3.6), (22.41198953, -2.794902369))
            ThreePointArc((22.41198953, -2.794902369), (22.424922467, -2.697481098), (22.437396466, -2.6))
            Line((22.437396466, -2.6), (11.014213562, -2.6))
            Line((11.014213562, -2.6), (11.014213562, -3.6))
        make_face()
    cut_extrude2_tool2 = split(extrude(cut_extrude2_sk2.sketch, amount=-CUT_EXTRUDE2_REACH, mode=Mode.PRIVATE), bisect_by=cut_extrude2_end, keep=Keep.BOTH, mode=Mode.PRIVATE)
    add(cut_extrude2_tool1.solids().sort_by(Axis((6.892893, 8, -5.280774), (0, -1, 0)))[0], mode=Mode.SUBTRACT)
    add(cut_extrude2_tool2.solids().sort_by(Axis((16.52998, 8, 3.09197), (0, -1, 0)))[0], mode=Mode.SUBTRACT)

    # Sketch8 → Boss-Extrude2 (add, up to next)
    with BuildSketch(Plane(origin=(0, 1.2, 0), x_dir=(1, 0, 0), z_dir=(0, 1, 0)), mode=Mode.PRIVATE) as boss_extrude2_sk1:
        with BuildLine():
            Line((-25.500000057, -2.939638034), (-25.500000089, -1.974900013))
            ThreePointArc((-25.500000089, -1.974900013), (-25.167059975, -2.378015361), (-25.004203015, -2.874833954))
            ThreePointArc((-25.004203015, -2.874833954), (-20.010058003, -14.278449513), (-9.682030795, -21.229405291))
            ThreePointArc((-9.682030795, -21.229405291), (-9.888367335, -21.853900378), (-9.989579706, -22.5037657))
            ThreePointArc((-9.989579706, -22.5037657), (-9.997394078, -22.647940296), (-10, -22.792302991))
            Line((-10, -22.792302991), (-10, -25.4))
            Line((-10, -25.4), (-25.500000053, -25.4))
            Line((-25.500000053, -25.4), (-25.500000053, -6.782960914))
            Line((-25.500000053, -6.782960914), (-25.500000053, -3.057274188))
            Line((-25.500000053, -3.057274188), (-25.500000057, -2.939638034))
        make_face()
    boss_extrude2_tool1 = extrude(boss_extrude2_sk1.sketch, amount=-BOSS_EXTRUDE2_REACH, mode=Mode.PRIVATE) - part_1.part
    add(boss_extrude2_tool1.solids().sort_by_distance((-19.853848, 1.2, 19.032769))[0])

    # Sketch7 → Boss-Extrude1 (add)
    with BuildSketch(Plane.XZ.offset(-0.5).offset(BOSS_EXTRUDE1_START)):
        with BuildLine():
            Line((0.5, -11.989578808), (0.5, -22.561022344))
            ThreePointArc((0.5, -22.561022344), (8.739410144, -21.025097131), (15.796609151, -16.503715933))
            Line((15.796609151, -16.503715933), (8.124359088, -8.831465869))
            ThreePointArc((8.124359088, -8.831465869), (4.592201188, -11.08655439), (0.5, -11.989578808))
        make_face()
        with BuildLine():
            Line((8.831465869, -8.124359088), (16.503715933, -15.796609151))
            ThreePointArc((16.503715933, -15.796609151), (20.456263822, -10.049295735), (22.398860789, -3.35))
            Line((22.398860789, -3.35), (11.522911958, -3.35))
            ThreePointArc((11.522911958, -3.35), (10.453410944, -5.892893995), (8.831465869, -8.124359088))
        make_face()
        with BuildLine():
            Line((11.522911958, 3.35), (22.186495338, 3.35))
            ThreePointArc((22.186495338, 3.35), (19.923839699, 9.729629785), (15.819320137, 15.112213356))
            Line((15.819320137, 15.112213356), (8.831465869, 8.124359088))
            ThreePointArc((8.831465869, 8.124359088), (10.453410944, 5.892893995), (11.522911958, 3.35))
        make_face()
        with BuildLine():
            Line((8.124359088, 8.831465869), (15.080867994, 15.787974775))
            ThreePointArc((15.080867994, 15.787974775), (8.286704941, 19.828810643), (0.5, 21.191246789))
            Line((0.5, 21.191246789), (0.5, 11.989578808))
            ThreePointArc((0.5, 11.989578808), (4.592201188, 11.08655439), (8.124359088, 8.831465869))
        make_face()
        with BuildLine():
            Line((-0.5, 11.989578808), (-0.5, 21.159916823))
            ThreePointArc((-0.5, 21.159916823), (-8.00263002, 19.393122123), (-14.426833596, 15.133940377))
            Line((-14.426833596, 15.133940377), (-8.124359088, 8.831465869))
            ThreePointArc((-8.124359088, 8.831465869), (-4.592201188, 11.08655439), (-0.5, 11.989578808))
        make_face()
        with BuildLine():
            Line((-8.831465869, 8.124359088), (-15.133940377, 14.426833596))
            ThreePointArc((-15.133940377, 14.426833596), (-19.393122123, 8.00263002), (-21.159916823, 0.5))
            Line((-21.159916823, 0.5), (-11.989578808, 0.5))
            ThreePointArc((-11.989578808, 0.5), (-11.08655439, 4.592201188), (-8.831465869, 8.124359088))
        make_face()
        with BuildLine():
            Line((-11.989578808, -0.5), (-21.191246789, -0.5))
            ThreePointArc((-21.191246789, -0.5), (-19.828810643, -8.286704941), (-15.787974775, -15.080867994))
            Line((-15.787974775, -15.080867994), (-8.831465869, -8.124359088))
            ThreePointArc((-8.831465869, -8.124359088), (-11.08655439, -4.592201188), (-11.989578808, -0.5))
        make_face()
        with BuildLine():
            Line((-8.124359088, -8.831465869), (-15.112213356, -15.819320137))
            ThreePointArc((-15.112213356, -15.819320137), (-8.444967684, -20.565662067), (-0.5, -22.529692378))
            Line((-0.5, -22.529692378), (-0.5, -11.989578808))
            ThreePointArc((-0.5, -11.989578808), (-4.592201188, -11.08655439), (-8.124359088, -8.831465869))
        make_face()
    extrude(amount=-BOSS_EXTRUDE1_DEPTH)

    # Эскиз11 → Вырез-Вытянуть8 (cut)
    with BuildSketch(Plane.XY.offset(25.4)):
        with Locations((-26.000000026, 4.6)):
            Rectangle(SKETCH_11_W, SKETCH_11_H)
        with Locations((-9.500000026, 4.6)):
            Rectangle(SKETCH_11_W, SKETCH_11_H)
    extrude(amount=-CUT_EXTRUDE_8_DEPTH, mode=Mode.SUBTRACT)


solid = part_1.part
